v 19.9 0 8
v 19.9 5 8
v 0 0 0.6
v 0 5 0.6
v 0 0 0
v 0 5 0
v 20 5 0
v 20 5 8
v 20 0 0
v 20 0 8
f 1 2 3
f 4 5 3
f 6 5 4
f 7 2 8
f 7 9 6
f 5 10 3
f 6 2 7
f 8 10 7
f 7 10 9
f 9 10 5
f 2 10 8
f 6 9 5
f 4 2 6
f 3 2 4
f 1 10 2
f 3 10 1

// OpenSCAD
width = 5;
length = 20;
max_thickness = 8;
min_thickness = 0.6;

hull() {
    cube([0.1, width, min_thickness]);
    translate([length-0.1, 0, 0]) {
        cube([0.1, width, max_thickness]);
    }
}
